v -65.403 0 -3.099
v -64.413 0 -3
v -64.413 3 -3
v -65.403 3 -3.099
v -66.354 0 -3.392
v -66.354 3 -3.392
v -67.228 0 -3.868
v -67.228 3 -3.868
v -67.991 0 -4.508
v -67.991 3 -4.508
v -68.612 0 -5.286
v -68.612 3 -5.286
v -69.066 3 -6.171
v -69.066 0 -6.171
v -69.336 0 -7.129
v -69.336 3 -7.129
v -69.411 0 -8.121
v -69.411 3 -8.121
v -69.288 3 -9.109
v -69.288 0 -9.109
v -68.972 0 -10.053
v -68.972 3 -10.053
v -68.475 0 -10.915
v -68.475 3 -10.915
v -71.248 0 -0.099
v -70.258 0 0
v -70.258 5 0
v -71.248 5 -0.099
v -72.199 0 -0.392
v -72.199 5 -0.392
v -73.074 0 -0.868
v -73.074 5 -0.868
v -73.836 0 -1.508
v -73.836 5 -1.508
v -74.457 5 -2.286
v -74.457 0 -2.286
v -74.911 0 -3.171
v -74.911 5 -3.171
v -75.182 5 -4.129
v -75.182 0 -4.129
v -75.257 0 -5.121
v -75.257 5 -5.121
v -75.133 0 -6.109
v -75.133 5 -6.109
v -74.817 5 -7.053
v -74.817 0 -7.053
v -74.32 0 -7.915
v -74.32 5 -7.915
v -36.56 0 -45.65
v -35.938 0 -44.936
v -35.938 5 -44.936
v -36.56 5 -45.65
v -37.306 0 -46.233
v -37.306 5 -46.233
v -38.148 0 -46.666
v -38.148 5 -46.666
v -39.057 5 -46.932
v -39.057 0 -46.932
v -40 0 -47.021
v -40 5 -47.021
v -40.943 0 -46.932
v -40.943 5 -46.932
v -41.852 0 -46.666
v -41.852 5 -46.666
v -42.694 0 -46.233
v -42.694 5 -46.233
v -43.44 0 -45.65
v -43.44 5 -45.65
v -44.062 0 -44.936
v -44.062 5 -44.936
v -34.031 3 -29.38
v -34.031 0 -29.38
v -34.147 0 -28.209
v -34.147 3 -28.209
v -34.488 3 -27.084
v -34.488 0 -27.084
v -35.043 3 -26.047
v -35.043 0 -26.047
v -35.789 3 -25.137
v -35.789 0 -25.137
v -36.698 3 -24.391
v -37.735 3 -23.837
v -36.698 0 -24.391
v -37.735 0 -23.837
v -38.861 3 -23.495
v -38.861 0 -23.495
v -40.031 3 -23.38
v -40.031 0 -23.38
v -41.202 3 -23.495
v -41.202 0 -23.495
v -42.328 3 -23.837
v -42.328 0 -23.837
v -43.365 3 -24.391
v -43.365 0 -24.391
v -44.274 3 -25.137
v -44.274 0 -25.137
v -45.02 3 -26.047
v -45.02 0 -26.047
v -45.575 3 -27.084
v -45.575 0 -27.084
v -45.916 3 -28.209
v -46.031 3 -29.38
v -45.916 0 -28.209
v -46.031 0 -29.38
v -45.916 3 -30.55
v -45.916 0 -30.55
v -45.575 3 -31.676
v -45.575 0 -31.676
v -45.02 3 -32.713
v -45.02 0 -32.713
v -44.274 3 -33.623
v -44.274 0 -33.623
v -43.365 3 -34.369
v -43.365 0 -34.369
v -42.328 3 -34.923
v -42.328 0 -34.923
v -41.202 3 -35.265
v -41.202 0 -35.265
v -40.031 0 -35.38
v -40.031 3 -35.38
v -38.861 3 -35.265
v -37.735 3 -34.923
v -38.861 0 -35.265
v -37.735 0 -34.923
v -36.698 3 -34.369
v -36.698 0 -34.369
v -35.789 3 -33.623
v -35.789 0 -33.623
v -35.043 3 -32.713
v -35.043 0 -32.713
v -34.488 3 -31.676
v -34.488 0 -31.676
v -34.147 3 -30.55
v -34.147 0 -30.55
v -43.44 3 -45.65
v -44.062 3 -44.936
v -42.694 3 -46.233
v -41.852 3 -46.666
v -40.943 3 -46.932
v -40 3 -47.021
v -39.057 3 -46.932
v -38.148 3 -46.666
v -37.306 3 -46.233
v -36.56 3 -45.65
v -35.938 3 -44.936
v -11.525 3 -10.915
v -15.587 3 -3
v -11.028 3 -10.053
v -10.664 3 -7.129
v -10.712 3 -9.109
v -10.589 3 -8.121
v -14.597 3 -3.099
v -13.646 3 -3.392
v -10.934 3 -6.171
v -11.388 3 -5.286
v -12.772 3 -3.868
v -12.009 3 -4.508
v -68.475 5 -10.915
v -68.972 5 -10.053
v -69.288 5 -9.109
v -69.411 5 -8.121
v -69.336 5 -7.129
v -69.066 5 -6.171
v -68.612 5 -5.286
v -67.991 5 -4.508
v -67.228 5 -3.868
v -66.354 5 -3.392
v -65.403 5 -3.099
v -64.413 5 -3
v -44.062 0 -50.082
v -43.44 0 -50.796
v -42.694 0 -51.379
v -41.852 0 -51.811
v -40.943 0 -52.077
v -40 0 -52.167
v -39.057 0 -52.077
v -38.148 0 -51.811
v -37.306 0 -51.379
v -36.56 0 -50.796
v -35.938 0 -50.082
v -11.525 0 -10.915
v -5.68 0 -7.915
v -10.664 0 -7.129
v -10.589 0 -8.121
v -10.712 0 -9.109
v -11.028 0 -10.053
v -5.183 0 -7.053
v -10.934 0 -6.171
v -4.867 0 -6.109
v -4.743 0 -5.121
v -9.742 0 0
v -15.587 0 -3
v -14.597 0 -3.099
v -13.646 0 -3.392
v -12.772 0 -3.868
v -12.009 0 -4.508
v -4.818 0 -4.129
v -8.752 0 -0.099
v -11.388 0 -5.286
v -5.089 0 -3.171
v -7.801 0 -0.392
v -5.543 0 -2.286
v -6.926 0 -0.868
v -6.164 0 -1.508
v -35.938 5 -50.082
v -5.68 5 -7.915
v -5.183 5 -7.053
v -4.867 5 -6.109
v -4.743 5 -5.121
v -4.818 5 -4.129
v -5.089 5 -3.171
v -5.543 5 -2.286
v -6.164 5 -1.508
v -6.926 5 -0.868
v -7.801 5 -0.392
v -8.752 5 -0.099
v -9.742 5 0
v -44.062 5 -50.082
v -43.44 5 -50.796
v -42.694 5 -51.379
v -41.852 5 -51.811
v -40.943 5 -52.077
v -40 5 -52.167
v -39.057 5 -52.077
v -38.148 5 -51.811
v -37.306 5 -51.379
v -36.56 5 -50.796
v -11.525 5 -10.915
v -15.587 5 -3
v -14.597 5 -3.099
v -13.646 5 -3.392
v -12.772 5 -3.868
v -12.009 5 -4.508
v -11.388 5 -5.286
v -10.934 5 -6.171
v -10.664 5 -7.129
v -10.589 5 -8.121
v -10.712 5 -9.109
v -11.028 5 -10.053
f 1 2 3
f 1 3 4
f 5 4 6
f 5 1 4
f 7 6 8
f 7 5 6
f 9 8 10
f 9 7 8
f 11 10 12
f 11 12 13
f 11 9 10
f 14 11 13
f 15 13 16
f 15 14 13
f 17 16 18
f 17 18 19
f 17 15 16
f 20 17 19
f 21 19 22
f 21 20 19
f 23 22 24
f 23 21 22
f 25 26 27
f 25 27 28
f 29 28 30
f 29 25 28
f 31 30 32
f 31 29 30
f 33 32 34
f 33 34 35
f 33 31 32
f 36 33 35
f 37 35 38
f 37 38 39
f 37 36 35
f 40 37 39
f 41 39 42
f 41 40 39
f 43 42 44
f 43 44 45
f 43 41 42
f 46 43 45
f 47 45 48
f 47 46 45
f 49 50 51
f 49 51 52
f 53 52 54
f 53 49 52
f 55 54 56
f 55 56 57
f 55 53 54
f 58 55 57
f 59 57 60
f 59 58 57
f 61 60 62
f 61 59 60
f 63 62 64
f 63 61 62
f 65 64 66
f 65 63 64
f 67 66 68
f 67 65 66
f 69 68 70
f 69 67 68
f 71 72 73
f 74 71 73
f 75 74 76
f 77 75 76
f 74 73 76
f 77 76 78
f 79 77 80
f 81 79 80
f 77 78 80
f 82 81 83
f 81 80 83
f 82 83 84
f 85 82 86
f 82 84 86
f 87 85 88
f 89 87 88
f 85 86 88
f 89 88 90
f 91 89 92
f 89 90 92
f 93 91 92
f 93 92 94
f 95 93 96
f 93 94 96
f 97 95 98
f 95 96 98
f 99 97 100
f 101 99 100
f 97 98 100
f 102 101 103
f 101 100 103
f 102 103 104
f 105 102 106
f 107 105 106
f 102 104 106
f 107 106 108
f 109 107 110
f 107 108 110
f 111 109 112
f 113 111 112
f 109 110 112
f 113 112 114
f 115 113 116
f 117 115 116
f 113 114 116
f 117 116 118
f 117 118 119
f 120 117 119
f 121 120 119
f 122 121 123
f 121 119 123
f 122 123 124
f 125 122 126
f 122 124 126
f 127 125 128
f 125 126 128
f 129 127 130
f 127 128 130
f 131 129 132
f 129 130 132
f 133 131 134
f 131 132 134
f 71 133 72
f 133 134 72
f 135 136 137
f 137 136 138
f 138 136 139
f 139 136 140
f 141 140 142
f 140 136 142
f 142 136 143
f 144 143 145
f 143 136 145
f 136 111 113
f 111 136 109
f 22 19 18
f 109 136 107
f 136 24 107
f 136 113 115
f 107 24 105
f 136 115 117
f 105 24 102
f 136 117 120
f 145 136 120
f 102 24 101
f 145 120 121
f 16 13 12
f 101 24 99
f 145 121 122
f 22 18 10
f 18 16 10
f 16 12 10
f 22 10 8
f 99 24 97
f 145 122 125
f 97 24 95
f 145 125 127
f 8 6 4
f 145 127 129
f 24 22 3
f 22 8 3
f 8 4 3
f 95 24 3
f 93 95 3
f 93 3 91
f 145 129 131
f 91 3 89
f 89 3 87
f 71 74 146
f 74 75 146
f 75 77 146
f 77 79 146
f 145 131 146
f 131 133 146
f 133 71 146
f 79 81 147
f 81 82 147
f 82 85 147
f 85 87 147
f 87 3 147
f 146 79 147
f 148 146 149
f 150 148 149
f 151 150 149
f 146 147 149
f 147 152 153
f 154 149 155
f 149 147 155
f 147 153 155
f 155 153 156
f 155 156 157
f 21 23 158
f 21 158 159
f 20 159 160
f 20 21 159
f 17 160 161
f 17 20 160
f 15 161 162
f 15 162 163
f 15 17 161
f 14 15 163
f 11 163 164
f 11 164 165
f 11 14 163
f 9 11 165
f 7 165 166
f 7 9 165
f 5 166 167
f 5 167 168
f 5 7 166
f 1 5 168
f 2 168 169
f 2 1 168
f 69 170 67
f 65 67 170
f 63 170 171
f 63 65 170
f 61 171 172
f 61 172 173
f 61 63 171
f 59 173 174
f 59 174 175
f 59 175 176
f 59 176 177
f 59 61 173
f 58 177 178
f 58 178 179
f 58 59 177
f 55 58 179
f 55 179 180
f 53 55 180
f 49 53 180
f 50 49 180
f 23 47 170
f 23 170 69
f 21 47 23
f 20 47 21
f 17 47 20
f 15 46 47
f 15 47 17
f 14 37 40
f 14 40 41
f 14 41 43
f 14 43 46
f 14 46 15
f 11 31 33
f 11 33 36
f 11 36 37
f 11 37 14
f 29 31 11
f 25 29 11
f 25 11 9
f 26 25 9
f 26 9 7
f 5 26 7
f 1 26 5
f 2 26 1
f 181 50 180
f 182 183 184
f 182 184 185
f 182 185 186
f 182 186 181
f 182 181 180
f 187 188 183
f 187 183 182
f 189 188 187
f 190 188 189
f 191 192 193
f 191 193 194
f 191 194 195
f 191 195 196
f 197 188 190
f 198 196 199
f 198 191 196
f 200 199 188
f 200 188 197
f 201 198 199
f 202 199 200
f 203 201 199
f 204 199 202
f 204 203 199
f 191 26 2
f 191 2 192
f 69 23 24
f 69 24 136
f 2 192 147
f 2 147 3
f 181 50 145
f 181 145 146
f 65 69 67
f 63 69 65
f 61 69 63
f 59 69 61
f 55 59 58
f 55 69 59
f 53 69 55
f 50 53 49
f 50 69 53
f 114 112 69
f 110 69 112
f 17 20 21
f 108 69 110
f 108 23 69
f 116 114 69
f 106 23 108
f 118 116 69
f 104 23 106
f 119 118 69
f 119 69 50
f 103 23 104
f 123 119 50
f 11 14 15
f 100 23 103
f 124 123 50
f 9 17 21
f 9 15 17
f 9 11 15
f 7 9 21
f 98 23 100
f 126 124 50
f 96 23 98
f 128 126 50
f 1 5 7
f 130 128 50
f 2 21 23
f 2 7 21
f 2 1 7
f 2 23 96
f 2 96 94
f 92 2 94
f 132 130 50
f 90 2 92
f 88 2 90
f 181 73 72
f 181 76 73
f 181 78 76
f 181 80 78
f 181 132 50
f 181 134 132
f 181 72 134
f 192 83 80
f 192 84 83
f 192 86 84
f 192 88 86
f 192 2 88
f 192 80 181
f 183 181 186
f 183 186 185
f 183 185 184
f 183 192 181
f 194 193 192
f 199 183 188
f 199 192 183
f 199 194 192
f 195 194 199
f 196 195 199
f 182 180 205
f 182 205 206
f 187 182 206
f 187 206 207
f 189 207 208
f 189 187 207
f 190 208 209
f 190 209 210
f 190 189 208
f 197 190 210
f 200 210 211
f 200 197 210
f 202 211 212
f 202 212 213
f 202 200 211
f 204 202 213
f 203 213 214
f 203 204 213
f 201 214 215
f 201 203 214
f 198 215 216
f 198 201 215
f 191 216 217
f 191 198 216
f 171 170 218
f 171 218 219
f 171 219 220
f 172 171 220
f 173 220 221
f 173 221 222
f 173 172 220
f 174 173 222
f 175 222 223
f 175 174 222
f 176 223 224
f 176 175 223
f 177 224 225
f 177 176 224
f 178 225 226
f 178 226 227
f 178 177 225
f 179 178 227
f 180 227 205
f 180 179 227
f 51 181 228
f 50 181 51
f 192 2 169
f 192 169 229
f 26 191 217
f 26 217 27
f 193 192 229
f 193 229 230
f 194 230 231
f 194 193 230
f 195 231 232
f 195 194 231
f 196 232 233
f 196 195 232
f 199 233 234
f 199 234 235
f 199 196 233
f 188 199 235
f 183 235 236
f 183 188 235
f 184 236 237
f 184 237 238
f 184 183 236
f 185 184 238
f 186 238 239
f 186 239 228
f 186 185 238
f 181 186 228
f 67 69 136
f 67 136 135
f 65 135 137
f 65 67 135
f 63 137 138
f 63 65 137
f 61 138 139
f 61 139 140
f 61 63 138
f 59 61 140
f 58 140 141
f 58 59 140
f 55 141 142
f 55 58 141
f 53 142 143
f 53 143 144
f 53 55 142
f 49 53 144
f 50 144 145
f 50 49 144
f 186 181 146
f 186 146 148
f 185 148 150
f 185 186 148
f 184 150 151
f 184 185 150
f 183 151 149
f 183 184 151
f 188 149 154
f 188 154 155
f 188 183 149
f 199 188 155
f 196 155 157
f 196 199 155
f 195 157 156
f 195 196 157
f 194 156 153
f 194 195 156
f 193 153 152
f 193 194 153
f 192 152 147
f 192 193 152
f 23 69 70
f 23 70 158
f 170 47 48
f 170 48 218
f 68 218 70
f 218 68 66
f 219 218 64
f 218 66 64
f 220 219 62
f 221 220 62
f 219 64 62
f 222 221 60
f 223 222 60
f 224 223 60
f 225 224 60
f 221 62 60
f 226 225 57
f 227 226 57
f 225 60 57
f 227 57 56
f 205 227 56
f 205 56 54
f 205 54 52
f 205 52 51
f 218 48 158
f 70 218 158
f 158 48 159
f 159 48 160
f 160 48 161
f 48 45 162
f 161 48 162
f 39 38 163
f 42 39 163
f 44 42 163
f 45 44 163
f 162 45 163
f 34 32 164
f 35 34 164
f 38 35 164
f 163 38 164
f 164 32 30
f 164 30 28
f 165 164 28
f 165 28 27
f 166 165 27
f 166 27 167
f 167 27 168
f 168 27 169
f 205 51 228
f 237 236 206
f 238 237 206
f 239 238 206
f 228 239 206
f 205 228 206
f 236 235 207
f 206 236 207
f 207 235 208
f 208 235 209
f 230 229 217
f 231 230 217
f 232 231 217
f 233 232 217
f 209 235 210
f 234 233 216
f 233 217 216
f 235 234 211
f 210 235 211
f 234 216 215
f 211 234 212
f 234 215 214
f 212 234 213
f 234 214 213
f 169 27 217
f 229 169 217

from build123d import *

# Parameters (mm, degrees)
F2_DEPTH = 5
F0_R     = 6
F3_DEPTH = 3


# Not quite as in the source:
# - the program builds the solid bodies; features that only make, move or delete a surface that nothing else refers to are left out


with BuildPart() as f2:
    # F0 (on Front) → F2 (new body)
    with BuildSketch(Plane.XZ):
        with BuildLine():
            ThreePointArc((-5.6796433529, -7.9150359145), (-5.293653969, -2.716929652), (-9.7419783486, 0))
            Line((-9.7419783486, 0), (-70.2580216514, 0))
            ThreePointArc((-70.2580216514, 0), (-74.706346031, -2.716929652), (-74.3203566471, -7.9150359145))
            Line((-74.3203566471, -7.9150359145), (-44.0623349957, -50.0820019003))
            ThreePointArc((-44.0623349957, -50.0820019003), (-40, -52.1669659858), (-35.9376650043, -50.0820019003))
            Line((-35.9376650043, -50.0820019003), (-5.6796433529, -7.9150359145))
        make_face()
        with BuildLine():
            ThreePointArc((-15.5871653577, -3), (-11.1388409781, -5.716929652), (-11.524830362, -10.9150359145))
            Line((-11.524830362, -10.9150359145), (-35.9376650043, -44.9362677002))
            ThreePointArc((-35.9376650043, -44.9362677002), (-40, -47.0212317857), (-44.0623349957, -44.9362677002))
            Line((-44.0623349957, -44.9362677002), (-68.475169638, -10.9150359145))
            ThreePointArc((-68.475169638, -10.9150359145), (-68.8611590219, -5.716929652), (-64.4128346423, -3))
            Line((-64.4128346423, -3), (-15.5871653577, -3))
        make_face(mode=Mode.SUBTRACT)
    extrude(amount=-F2_DEPTH)


with BuildPart() as f3:
    # F0 (on Front) → F3 (new body)
    with BuildSketch(Plane.XZ):
        with BuildLine():
            Line((-35.9376650043, -44.9362677002), (-11.524830362, -10.9150359145))
            ThreePointArc((-11.524830362, -10.9150359145), (-11.1388409781, -5.716929652), (-15.5871653577, -3))
            Line((-15.5871653577, -3), (-64.4128346423, -3))
            ThreePointArc((-64.4128346423, -3), (-68.8611590219, -5.716929652), (-68.475169638, -10.9150359145))
            Line((-68.475169638, -10.9150359145), (-44.0623349957, -44.9362677002))
            ThreePointArc((-44.0623349957, -44.9362677002), (-40, -47.0212317857), (-35.9376650043, -44.9362677002))
        make_face()
        with Locations((-40.0314554572, -29.3799452484)):
            Circle(F0_R, mode=Mode.SUBTRACT)
    extrude(amount=-F3_DEPTH)


solid = Compound([f2.part, f3.part])
